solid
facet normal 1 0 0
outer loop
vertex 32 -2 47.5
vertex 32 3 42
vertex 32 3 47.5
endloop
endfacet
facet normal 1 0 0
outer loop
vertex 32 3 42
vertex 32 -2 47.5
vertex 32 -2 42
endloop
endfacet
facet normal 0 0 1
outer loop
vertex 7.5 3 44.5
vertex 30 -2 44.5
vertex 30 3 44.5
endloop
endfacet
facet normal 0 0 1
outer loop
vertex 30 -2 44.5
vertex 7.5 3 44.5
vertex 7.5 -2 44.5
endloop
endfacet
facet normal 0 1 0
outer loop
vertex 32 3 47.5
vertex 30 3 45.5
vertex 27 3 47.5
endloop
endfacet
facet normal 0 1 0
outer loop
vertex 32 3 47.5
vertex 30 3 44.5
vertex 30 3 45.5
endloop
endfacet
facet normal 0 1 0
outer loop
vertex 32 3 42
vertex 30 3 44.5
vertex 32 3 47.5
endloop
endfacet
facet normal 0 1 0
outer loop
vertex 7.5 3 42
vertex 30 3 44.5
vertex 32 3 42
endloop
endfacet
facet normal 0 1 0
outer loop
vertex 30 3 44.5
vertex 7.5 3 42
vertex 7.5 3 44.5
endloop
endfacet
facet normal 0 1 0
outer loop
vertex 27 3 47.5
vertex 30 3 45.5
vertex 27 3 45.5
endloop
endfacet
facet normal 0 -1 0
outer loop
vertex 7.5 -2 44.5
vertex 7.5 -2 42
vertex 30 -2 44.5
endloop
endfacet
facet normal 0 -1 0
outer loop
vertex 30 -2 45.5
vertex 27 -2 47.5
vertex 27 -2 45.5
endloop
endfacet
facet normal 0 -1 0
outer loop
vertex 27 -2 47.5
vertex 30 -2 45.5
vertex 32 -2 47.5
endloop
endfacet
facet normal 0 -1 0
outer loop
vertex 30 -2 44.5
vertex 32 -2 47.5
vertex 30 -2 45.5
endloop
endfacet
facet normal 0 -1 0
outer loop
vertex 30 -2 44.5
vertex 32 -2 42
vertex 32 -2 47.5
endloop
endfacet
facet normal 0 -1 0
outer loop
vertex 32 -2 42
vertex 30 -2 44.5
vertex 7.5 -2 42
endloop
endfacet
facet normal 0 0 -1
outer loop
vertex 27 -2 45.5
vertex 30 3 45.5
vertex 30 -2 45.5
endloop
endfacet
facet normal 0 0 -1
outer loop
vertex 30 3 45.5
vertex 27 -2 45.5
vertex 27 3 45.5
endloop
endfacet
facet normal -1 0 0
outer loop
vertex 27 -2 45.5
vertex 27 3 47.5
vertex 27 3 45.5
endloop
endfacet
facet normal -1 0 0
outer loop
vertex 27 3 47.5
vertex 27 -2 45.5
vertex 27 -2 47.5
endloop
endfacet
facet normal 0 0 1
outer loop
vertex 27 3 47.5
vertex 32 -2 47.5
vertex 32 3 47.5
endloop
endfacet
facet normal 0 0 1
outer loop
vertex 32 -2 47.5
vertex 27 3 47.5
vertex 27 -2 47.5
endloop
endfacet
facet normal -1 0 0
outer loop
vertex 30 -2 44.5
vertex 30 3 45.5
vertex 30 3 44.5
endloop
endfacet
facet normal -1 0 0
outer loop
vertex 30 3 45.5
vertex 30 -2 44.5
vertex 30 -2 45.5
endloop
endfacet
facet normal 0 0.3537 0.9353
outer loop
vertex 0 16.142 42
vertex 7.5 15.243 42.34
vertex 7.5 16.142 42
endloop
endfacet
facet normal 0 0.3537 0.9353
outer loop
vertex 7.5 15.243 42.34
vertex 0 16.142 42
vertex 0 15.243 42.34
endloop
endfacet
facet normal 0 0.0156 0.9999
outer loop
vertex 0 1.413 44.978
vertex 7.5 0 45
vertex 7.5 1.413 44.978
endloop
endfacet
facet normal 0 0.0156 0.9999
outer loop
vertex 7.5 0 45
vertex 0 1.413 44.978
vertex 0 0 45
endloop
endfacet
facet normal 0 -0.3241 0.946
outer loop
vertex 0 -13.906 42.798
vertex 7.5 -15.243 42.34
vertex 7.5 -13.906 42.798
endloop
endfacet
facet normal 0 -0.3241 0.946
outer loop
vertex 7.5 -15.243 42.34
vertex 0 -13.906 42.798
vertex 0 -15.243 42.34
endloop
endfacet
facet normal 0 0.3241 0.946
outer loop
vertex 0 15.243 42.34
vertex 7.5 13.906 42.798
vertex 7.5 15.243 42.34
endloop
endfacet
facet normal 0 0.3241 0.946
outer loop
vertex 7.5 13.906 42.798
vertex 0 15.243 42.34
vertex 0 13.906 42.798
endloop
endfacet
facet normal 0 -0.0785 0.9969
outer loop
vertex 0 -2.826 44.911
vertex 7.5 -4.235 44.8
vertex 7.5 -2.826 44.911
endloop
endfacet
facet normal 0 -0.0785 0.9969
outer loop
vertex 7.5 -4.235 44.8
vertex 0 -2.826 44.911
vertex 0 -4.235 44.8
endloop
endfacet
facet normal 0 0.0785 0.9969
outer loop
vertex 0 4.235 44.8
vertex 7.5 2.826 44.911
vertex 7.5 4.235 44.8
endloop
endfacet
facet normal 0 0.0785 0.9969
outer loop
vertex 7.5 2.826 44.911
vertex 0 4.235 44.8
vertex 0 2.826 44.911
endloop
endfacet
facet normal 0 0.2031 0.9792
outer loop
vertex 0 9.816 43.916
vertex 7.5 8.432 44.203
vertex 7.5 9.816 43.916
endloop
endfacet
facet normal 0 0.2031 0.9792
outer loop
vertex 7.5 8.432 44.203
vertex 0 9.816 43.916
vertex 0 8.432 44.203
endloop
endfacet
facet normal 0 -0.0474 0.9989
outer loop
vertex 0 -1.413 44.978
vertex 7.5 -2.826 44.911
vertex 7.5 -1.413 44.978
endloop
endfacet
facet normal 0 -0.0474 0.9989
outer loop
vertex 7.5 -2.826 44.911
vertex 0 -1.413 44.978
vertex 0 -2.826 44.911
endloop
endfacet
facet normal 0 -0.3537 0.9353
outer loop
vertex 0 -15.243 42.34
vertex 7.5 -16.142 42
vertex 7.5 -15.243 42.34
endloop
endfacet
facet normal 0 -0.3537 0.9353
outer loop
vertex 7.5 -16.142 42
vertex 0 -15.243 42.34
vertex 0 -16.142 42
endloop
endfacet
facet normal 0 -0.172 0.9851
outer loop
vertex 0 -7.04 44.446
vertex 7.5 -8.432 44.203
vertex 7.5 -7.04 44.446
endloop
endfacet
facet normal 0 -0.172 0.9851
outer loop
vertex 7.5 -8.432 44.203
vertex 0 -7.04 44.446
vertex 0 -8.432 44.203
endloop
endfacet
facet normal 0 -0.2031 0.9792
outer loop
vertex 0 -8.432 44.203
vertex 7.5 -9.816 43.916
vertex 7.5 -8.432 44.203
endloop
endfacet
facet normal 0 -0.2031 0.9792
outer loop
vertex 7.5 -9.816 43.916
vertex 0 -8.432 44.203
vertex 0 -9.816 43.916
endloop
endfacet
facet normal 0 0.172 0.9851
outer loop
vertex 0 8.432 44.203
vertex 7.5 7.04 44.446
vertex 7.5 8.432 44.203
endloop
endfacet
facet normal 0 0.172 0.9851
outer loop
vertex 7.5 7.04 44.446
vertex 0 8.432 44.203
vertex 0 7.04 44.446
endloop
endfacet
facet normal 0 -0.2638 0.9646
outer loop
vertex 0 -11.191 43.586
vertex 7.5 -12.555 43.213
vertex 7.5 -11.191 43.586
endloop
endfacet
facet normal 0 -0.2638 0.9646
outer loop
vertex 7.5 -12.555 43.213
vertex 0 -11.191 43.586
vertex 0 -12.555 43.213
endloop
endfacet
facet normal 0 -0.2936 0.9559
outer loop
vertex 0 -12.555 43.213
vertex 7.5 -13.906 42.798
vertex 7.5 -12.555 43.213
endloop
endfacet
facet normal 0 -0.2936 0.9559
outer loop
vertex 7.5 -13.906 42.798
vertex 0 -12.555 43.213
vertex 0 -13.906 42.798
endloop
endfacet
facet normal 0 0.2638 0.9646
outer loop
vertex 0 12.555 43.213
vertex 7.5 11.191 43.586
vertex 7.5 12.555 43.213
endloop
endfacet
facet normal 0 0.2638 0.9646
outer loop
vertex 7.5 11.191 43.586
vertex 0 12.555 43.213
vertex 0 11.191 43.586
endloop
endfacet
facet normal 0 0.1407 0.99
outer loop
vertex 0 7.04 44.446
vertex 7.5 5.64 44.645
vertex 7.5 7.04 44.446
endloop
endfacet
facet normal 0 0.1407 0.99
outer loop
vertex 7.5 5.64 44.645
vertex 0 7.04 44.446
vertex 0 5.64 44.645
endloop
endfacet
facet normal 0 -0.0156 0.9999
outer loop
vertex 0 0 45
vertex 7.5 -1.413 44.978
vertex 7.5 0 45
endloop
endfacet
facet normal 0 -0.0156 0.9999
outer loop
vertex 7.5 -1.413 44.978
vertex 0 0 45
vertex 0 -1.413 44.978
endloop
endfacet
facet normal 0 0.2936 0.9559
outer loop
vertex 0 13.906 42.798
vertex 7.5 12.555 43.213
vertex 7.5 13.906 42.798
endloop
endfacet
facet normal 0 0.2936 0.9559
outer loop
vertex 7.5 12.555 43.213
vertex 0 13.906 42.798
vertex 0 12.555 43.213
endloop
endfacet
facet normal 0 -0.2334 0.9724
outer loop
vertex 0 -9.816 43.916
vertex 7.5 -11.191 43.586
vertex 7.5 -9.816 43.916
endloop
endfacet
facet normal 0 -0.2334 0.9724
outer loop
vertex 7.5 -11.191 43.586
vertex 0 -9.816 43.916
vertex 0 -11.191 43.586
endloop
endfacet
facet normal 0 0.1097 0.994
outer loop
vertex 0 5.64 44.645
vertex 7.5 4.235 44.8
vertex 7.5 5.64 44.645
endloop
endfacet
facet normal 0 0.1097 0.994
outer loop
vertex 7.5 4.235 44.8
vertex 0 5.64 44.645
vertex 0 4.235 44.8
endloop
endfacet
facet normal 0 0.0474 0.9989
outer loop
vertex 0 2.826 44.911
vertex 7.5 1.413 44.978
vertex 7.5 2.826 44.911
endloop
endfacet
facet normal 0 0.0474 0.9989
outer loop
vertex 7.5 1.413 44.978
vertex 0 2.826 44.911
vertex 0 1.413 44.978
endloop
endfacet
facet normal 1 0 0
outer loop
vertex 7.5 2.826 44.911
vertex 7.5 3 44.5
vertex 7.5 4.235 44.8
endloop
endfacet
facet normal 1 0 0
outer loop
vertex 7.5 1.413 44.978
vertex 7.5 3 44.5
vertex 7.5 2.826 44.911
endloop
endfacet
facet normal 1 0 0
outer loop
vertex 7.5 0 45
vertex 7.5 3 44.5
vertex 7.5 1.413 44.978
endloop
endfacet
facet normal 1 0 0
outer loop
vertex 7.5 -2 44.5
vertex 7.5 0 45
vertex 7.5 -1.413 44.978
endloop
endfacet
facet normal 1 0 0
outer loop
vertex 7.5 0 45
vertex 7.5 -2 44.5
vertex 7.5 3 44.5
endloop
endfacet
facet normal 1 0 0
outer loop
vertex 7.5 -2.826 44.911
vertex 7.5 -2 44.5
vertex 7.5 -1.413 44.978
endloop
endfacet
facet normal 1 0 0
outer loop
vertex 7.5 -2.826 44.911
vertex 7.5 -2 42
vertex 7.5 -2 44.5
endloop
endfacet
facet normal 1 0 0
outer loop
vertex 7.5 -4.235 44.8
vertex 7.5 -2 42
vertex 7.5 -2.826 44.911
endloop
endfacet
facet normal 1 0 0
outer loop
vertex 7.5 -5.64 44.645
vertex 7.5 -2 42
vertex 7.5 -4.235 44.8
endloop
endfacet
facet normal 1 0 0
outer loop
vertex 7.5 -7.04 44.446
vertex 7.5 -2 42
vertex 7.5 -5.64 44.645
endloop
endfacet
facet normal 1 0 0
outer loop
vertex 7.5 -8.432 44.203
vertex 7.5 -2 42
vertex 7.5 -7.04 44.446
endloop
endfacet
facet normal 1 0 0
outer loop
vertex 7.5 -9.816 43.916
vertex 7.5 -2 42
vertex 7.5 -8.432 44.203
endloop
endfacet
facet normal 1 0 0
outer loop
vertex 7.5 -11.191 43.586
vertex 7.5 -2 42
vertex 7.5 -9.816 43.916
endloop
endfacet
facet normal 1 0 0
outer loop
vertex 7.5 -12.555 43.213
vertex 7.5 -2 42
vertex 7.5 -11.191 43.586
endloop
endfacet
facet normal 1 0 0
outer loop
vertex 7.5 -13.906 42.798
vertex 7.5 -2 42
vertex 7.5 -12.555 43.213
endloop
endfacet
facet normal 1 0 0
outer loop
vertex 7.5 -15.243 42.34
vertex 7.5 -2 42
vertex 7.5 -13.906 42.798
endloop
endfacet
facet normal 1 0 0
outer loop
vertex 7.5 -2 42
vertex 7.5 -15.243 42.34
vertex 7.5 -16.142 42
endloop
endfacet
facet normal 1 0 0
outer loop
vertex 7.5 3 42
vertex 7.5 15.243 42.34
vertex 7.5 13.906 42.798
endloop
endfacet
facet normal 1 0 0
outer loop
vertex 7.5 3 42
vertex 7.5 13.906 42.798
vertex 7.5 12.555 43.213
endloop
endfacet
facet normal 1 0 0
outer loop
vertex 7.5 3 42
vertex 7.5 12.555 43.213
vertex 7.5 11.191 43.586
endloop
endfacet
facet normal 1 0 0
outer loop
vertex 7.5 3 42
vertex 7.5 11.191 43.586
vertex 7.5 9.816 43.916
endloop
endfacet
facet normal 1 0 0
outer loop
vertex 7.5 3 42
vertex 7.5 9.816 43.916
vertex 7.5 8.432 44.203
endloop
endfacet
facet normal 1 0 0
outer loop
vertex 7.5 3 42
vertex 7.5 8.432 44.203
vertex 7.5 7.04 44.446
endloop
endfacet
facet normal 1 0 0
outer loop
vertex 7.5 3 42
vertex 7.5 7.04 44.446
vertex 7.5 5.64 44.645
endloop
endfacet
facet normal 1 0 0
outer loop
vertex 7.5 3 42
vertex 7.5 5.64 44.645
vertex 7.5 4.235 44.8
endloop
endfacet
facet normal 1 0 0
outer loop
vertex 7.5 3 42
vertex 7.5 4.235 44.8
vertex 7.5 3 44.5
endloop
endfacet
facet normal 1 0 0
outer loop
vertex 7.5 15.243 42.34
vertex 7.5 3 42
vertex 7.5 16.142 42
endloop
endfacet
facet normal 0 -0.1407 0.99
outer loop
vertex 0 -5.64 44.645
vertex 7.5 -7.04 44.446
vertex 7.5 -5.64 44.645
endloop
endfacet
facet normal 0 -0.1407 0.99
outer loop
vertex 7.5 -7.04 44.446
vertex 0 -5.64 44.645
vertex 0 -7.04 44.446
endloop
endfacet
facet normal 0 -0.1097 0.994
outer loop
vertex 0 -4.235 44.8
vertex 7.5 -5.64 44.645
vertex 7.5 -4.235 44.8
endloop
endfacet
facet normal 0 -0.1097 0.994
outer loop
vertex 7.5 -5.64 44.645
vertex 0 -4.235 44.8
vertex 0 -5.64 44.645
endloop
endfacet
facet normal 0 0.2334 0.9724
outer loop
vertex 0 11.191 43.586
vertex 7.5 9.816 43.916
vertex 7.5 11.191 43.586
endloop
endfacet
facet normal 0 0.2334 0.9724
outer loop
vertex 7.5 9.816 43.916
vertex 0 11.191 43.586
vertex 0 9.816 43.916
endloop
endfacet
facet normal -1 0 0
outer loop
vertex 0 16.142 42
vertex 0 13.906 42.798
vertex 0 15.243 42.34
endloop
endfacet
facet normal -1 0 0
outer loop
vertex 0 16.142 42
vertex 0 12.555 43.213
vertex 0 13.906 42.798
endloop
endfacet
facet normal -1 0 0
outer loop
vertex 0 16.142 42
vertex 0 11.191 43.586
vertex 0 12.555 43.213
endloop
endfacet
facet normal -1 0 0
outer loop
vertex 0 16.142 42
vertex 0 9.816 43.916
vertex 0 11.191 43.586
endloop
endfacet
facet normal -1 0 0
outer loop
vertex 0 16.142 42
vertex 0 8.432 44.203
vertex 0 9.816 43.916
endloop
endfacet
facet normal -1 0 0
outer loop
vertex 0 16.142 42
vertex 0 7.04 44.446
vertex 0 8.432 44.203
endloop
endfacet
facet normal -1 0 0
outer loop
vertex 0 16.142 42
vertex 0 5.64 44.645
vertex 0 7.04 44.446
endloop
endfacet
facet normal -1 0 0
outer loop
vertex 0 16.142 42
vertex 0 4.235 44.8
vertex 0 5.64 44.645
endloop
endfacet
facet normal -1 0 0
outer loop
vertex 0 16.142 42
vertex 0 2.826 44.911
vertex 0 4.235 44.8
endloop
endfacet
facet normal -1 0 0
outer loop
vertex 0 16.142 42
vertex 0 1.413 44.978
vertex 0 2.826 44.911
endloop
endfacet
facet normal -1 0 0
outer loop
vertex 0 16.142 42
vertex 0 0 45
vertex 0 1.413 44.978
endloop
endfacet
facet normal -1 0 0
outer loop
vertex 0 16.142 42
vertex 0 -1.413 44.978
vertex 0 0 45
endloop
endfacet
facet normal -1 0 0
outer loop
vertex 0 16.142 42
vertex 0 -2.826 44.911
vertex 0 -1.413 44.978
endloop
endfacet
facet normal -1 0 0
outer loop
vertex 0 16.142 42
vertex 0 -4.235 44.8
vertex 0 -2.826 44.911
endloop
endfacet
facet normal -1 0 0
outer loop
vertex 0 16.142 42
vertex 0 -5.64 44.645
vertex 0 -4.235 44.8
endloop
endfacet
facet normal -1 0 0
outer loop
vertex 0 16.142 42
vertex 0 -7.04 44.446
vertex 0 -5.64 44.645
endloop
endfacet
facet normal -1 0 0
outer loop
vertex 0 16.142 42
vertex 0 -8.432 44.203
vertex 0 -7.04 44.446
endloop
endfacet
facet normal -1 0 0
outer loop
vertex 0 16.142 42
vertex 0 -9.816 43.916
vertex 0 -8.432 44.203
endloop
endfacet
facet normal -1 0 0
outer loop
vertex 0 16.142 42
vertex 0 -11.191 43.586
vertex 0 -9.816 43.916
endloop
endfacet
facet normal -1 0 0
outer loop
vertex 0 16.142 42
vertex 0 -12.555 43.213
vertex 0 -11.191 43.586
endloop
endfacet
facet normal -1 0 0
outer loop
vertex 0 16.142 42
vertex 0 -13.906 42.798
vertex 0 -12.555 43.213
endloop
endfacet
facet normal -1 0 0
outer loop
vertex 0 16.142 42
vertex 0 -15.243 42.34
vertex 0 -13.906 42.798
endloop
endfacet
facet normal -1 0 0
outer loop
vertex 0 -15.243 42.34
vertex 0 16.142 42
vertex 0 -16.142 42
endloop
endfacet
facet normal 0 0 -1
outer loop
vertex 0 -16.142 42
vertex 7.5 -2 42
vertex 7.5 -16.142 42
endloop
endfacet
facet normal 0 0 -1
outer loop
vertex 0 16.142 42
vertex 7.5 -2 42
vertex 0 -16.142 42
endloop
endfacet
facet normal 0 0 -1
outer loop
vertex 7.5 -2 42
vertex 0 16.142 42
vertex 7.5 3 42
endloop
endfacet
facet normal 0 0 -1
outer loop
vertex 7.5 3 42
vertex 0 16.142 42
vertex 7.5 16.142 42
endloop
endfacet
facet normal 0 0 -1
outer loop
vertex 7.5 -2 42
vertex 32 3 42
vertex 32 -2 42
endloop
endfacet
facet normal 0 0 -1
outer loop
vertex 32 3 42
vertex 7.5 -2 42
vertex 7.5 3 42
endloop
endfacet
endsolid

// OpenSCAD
// file: ../sc.scad
// ShortCuts.scad 
// Autor: Rudolf Huttary, Berlin 2015
//
$fn = 100; 

//show_examples(); 

module show_examples()
	place_in_rect(30, 30)
	{
		Cy(h = 10); 
		CyH(h = 10); 
		CyH(h = 10, w = 30); 
		CyS(h = 10); 
		CyS(h = 10, w1 = 25, w2 = 75); 
		Cu(10); 
		Ri(h = 10); 
		RiH(h = 10); 
		RiS(h = 10, w1 = 10); 
		RiS(h = 10, w1 = 30, w2 = 300); 
		Sp(); 
		SpH(10, 30, 30); 
	}


module help()
{
echo("==============="); 
echo("help(): shows this help"); 
echo("show_examples(): shows some examples"); 
echo("place_in_rect(): places children objects in grid"); 
echo("Transformations:"); 
echo(" transform :  T(x=0, y=0, z=0), Tx(x=0) , Ty(y=0), Tz(z=0)"); 
echo(" rotate :  R(x=0, y=0, z=0), Rx(x=0) , Ry(y=0), Rz(z=0)"); 
echo(" scale :  S(x=1, y=1, z=1), Sx(x=1) , Sy(y=1), Sz(z=1)"); 
echo("Logical"); 
echo(" difference :  D()"); 
echo(" union :  U()"); 
echo(" intersection : *missing*"); 
echo("Primitives"); 
echo(" circle :  Ci(r=10)"); 
echo(" circle_half :  CiH(r=10, w=0)")
echo(" circle_segment :  CiS(r=10, w1=0, w2=90)")
echo(" square :  Sq(x=10, y=0, center=true))"); 
echo(" cylinder :  Cy(r=10, h=1, center=true)"); 
echo(" cylinder_half :  CyH(r=10, w=0)")
echo(" cylinder_segment: CyS(r=10, h=1, w1=0, w2=90,center=true)"); 
echo(" cylinder_segment: Pie(r=10, h=1, w1=0, w2=90,center=true)"); 
echo(" cube :  Cu(x=10, y=0, z=10, center=true)"); 
echo(" ring :  Ri(R=10, r=5, h=1, center=true)"); 
echo(" ring_half :  RiH(R=10, r=5, h=1, w=0 center=true)"); 
echo(" ring_segment :  RiS(R=10, r=5, h=1, w1=0, w2=90, center=true)"); 
echo(" sphere:  Sp(r=10))"); 
echo(" sphere_half:  SpH(r=10, w1 = 0, w2 = 0))"); 
echo("==============="); 
}

// Euclidean Transformations
module T(x=0, y=0, z=0){translate([x, y, z])children(); }
module Tx(x) { translate([x, 0, 0])children(); }
module Ty(y) { translate([0, y, 0])children(); }
module Tz(z) { translate([0, 0, z])children(); }

module R(x=0, y=0, z=0){rotate([x, y, z]) children();}
module Rx(x=90){rotate([x, 0, 0]) children();}
module Ry(y=90){rotate([0, y, 0]) children();}
module Rz(z=90){rotate([0, 0, z]) children();}

module M(x=0, y=0, z=0){mirror([x, y, z]) children();}
module Mx(x=1){mirror([x, 0, 0]) children();}
module My(y=1){mirror([0, y, 0]) children();}
module Mz(z=1){mirror([0, 0, z]) children();}

module S(x=1, y=1, z=1){scale([x, y, z]) children();}
module Sx(x=1){scale([x, 1, 1]) children();}
module Sy(y=1){scale([1, y, 1]) children();}
module Sz(z=1){scale([1, 1, z]) children();}

module D() difference(){children(0); children([1:$children-1]);}
module U() children([0:$children-1]);
// module I() intersection()children([0:$children-1]); // does not work for some reason


// primitives - 2D

module Sq(x =10, y = 0, center = false)
{
   if(y==0)
		square([x, x], center = center); 
	else
		square([x, y], center = center); 
}
module Ci(r = 10)
{
	circle(r = r); 
}

// derived primitives - 2d
module CiH(r = 10, w = 0)
  circle_half(r, w); 

module CiS(r = 10, w1 = 0, w2 = 90)
  circle_segment(r, w1, w2); 


// primitives - 3d
module Cy(r = 10, h = 1, center = false)
{
	cylinder(r = r, h = h, center = center); 
}
module Cu(x = 10, y = 0, z = 10, center = false)
{
  if (y==0)
	cube([x, x, x], center = center); 
  else
	cube([x, y, z], center = center); 
}

// derived primitives - 3d
module CyH(r = 10, h = 1, w = 0, center = false)
  cylinder_half(r, h, w, center); 

module CyS(r = 10, h = 1, w1 = 0, w2 = 90, center = false)
  cylinder_segment(r, h, w1, w2, center); 

module Ri(R = 10, r = 5, h = 1, center = false)
  ring(R, r, h, center); 

module RiS(R = 10, r = 5, h = 1, w1 = 0, w2 = 90, center = false)
   ring_segment(R, r, h, w1, w2, center); 

module RiH(r1 = 10, r2, h = 1, w = 0, center = false)
   ring_half(r1, r2, h, w, center); 
module Pie(r = 10, h = 1, w1 = 0, w2 = 90, center = false)
  cylinder_segment(r, h, w1, w2, center);  
module Sp(r = 10)
  sphere(r); 
module SpH(r = 10, w1 = 0, w2 = 0)
  sphere_half(r, w1, w2); 
module SpS(r = 10, w1 = 0, w2 = 90, w3 = 90)
  sphere_segment(r, w1, w2); 




// clear text definitions
module circle_half(r = 10, w = 0)
{
	difference()
	{
		circle(r); 
     rotate([0, 0, w-90])
     translate([0, -r])
		square([r, 2*r], center = false); 
	}
}

module circle_segment(r = 10, w1 = 0, w2 = 90)
{
  W2 = (w1>w2)?w2+360:w2; 
  if (W2-w1 < 180)
    intersection()
		{
       circle_half(r, w1); 
       circle_half(r, W2-180); 
 		}
	else
    union()
		{
       circle_half(r, w1); 
       circle_half(r, W2-180); 
 		}
}

module cylinder_half(r = 10, h = 1, w = 0, center = true)
{
  linear_extrude(height = h, center = center)
  circle_half(r, w); 
} 

module cylinder_segment(r = 10, h = 1, w1 = 0, w2 = 90, center = true)
{
  linear_extrude(height = h, center = center)
  circle_segment(r, w1, w2); 
} 

module ring(R = 10, r = 5, h = 1, center = true)
{
	difference()
	{
	cylinder(r = R, h = h, center = center); 
   translate([0, 0, -2*h])
	cylinder(r = r, h = 4*h, center = false); 
	}
}

module ring_half(R = 10, r = 5, h = 1, w = 0, center = true)
{
	difference()
	{
		ring(R, r, h, center); 
     rotate([0, 0, w])
     translate([0, -R/2, 0])
		cube([2*R, R, 3*h], center = true); 
	}
}

module ring_segment(R = 10, r = 5, h = 1, w1 = 0, w2 = 90, center = true)
{
  W2 = (w1>w2)?w2+360:w2; 
  if (W2-w1 < 180)
    intersection()
		{
       ring_half(R, r, h, w1, center); 
       ring_half(R, r, h, W2-180, center); 
 		}
	else
    union()
		{
       ring_half(R, r, h, w1, center); 
       ring_half(R, r, h, W2-180, center); 
 		}
}


module sphere_half(r = 10, w1 = 0, w2 = 0)
{  
	difference()
	{
   	sphere(r); 
      rotate([-w1, -w2, 0])
     	translate([0, 0, r])
		cube([2*r, 2*r, r], center = true); 
	}

}


// additional code
module place_in_rect(dx =20, dy=20)
{
  cols = ceil(sqrt($children)); 
  rows = floor(sqrt($children)); 
  for(i = [0:$children-1])
	{ 
	  T(dx*(-cols/2+(i%cols)+.5), dy*(rows/2-floor(i/cols)-.5))
		 children(i); 
	}
}
// main file
use <../lib.scad>
$fn=200;


sh=90;
t=2;
h=30;

rotate([0,90,0])
difference(){
    union(){
        translate([0,0,0])
        cylinder(d=sh, h=h/4);

            
        // nose support
        translate([-sh/2+.5,-2,t])
        rotate([0,0,0]) {
            cube([4,5,h]);
            /*
            translate([0,5,10+t])
            rotate([0,0,90])
            vcylinder(d=15,h=4);
            /* clip */
            translate([-t-1,0,h-5])
            cube([t,5,5]);
            translate([-t-1,0,h-t])
            cube([t+1+4,5,t]);
        }
    }


    // Cut 
    translate([10,0,-.1])
    cylinder(d=80, h=h);
    
    translate([-5,-sh,-.1])
    cube([sh,sh*2,h]);
    
    //
    translate([t*2,0,-.1])
    cylinder(d=sh, h=h*2);
    
    translate([-sh/2+3,-sh,-.1])
    cube([sh,sh*2,h*2]);
    
}
